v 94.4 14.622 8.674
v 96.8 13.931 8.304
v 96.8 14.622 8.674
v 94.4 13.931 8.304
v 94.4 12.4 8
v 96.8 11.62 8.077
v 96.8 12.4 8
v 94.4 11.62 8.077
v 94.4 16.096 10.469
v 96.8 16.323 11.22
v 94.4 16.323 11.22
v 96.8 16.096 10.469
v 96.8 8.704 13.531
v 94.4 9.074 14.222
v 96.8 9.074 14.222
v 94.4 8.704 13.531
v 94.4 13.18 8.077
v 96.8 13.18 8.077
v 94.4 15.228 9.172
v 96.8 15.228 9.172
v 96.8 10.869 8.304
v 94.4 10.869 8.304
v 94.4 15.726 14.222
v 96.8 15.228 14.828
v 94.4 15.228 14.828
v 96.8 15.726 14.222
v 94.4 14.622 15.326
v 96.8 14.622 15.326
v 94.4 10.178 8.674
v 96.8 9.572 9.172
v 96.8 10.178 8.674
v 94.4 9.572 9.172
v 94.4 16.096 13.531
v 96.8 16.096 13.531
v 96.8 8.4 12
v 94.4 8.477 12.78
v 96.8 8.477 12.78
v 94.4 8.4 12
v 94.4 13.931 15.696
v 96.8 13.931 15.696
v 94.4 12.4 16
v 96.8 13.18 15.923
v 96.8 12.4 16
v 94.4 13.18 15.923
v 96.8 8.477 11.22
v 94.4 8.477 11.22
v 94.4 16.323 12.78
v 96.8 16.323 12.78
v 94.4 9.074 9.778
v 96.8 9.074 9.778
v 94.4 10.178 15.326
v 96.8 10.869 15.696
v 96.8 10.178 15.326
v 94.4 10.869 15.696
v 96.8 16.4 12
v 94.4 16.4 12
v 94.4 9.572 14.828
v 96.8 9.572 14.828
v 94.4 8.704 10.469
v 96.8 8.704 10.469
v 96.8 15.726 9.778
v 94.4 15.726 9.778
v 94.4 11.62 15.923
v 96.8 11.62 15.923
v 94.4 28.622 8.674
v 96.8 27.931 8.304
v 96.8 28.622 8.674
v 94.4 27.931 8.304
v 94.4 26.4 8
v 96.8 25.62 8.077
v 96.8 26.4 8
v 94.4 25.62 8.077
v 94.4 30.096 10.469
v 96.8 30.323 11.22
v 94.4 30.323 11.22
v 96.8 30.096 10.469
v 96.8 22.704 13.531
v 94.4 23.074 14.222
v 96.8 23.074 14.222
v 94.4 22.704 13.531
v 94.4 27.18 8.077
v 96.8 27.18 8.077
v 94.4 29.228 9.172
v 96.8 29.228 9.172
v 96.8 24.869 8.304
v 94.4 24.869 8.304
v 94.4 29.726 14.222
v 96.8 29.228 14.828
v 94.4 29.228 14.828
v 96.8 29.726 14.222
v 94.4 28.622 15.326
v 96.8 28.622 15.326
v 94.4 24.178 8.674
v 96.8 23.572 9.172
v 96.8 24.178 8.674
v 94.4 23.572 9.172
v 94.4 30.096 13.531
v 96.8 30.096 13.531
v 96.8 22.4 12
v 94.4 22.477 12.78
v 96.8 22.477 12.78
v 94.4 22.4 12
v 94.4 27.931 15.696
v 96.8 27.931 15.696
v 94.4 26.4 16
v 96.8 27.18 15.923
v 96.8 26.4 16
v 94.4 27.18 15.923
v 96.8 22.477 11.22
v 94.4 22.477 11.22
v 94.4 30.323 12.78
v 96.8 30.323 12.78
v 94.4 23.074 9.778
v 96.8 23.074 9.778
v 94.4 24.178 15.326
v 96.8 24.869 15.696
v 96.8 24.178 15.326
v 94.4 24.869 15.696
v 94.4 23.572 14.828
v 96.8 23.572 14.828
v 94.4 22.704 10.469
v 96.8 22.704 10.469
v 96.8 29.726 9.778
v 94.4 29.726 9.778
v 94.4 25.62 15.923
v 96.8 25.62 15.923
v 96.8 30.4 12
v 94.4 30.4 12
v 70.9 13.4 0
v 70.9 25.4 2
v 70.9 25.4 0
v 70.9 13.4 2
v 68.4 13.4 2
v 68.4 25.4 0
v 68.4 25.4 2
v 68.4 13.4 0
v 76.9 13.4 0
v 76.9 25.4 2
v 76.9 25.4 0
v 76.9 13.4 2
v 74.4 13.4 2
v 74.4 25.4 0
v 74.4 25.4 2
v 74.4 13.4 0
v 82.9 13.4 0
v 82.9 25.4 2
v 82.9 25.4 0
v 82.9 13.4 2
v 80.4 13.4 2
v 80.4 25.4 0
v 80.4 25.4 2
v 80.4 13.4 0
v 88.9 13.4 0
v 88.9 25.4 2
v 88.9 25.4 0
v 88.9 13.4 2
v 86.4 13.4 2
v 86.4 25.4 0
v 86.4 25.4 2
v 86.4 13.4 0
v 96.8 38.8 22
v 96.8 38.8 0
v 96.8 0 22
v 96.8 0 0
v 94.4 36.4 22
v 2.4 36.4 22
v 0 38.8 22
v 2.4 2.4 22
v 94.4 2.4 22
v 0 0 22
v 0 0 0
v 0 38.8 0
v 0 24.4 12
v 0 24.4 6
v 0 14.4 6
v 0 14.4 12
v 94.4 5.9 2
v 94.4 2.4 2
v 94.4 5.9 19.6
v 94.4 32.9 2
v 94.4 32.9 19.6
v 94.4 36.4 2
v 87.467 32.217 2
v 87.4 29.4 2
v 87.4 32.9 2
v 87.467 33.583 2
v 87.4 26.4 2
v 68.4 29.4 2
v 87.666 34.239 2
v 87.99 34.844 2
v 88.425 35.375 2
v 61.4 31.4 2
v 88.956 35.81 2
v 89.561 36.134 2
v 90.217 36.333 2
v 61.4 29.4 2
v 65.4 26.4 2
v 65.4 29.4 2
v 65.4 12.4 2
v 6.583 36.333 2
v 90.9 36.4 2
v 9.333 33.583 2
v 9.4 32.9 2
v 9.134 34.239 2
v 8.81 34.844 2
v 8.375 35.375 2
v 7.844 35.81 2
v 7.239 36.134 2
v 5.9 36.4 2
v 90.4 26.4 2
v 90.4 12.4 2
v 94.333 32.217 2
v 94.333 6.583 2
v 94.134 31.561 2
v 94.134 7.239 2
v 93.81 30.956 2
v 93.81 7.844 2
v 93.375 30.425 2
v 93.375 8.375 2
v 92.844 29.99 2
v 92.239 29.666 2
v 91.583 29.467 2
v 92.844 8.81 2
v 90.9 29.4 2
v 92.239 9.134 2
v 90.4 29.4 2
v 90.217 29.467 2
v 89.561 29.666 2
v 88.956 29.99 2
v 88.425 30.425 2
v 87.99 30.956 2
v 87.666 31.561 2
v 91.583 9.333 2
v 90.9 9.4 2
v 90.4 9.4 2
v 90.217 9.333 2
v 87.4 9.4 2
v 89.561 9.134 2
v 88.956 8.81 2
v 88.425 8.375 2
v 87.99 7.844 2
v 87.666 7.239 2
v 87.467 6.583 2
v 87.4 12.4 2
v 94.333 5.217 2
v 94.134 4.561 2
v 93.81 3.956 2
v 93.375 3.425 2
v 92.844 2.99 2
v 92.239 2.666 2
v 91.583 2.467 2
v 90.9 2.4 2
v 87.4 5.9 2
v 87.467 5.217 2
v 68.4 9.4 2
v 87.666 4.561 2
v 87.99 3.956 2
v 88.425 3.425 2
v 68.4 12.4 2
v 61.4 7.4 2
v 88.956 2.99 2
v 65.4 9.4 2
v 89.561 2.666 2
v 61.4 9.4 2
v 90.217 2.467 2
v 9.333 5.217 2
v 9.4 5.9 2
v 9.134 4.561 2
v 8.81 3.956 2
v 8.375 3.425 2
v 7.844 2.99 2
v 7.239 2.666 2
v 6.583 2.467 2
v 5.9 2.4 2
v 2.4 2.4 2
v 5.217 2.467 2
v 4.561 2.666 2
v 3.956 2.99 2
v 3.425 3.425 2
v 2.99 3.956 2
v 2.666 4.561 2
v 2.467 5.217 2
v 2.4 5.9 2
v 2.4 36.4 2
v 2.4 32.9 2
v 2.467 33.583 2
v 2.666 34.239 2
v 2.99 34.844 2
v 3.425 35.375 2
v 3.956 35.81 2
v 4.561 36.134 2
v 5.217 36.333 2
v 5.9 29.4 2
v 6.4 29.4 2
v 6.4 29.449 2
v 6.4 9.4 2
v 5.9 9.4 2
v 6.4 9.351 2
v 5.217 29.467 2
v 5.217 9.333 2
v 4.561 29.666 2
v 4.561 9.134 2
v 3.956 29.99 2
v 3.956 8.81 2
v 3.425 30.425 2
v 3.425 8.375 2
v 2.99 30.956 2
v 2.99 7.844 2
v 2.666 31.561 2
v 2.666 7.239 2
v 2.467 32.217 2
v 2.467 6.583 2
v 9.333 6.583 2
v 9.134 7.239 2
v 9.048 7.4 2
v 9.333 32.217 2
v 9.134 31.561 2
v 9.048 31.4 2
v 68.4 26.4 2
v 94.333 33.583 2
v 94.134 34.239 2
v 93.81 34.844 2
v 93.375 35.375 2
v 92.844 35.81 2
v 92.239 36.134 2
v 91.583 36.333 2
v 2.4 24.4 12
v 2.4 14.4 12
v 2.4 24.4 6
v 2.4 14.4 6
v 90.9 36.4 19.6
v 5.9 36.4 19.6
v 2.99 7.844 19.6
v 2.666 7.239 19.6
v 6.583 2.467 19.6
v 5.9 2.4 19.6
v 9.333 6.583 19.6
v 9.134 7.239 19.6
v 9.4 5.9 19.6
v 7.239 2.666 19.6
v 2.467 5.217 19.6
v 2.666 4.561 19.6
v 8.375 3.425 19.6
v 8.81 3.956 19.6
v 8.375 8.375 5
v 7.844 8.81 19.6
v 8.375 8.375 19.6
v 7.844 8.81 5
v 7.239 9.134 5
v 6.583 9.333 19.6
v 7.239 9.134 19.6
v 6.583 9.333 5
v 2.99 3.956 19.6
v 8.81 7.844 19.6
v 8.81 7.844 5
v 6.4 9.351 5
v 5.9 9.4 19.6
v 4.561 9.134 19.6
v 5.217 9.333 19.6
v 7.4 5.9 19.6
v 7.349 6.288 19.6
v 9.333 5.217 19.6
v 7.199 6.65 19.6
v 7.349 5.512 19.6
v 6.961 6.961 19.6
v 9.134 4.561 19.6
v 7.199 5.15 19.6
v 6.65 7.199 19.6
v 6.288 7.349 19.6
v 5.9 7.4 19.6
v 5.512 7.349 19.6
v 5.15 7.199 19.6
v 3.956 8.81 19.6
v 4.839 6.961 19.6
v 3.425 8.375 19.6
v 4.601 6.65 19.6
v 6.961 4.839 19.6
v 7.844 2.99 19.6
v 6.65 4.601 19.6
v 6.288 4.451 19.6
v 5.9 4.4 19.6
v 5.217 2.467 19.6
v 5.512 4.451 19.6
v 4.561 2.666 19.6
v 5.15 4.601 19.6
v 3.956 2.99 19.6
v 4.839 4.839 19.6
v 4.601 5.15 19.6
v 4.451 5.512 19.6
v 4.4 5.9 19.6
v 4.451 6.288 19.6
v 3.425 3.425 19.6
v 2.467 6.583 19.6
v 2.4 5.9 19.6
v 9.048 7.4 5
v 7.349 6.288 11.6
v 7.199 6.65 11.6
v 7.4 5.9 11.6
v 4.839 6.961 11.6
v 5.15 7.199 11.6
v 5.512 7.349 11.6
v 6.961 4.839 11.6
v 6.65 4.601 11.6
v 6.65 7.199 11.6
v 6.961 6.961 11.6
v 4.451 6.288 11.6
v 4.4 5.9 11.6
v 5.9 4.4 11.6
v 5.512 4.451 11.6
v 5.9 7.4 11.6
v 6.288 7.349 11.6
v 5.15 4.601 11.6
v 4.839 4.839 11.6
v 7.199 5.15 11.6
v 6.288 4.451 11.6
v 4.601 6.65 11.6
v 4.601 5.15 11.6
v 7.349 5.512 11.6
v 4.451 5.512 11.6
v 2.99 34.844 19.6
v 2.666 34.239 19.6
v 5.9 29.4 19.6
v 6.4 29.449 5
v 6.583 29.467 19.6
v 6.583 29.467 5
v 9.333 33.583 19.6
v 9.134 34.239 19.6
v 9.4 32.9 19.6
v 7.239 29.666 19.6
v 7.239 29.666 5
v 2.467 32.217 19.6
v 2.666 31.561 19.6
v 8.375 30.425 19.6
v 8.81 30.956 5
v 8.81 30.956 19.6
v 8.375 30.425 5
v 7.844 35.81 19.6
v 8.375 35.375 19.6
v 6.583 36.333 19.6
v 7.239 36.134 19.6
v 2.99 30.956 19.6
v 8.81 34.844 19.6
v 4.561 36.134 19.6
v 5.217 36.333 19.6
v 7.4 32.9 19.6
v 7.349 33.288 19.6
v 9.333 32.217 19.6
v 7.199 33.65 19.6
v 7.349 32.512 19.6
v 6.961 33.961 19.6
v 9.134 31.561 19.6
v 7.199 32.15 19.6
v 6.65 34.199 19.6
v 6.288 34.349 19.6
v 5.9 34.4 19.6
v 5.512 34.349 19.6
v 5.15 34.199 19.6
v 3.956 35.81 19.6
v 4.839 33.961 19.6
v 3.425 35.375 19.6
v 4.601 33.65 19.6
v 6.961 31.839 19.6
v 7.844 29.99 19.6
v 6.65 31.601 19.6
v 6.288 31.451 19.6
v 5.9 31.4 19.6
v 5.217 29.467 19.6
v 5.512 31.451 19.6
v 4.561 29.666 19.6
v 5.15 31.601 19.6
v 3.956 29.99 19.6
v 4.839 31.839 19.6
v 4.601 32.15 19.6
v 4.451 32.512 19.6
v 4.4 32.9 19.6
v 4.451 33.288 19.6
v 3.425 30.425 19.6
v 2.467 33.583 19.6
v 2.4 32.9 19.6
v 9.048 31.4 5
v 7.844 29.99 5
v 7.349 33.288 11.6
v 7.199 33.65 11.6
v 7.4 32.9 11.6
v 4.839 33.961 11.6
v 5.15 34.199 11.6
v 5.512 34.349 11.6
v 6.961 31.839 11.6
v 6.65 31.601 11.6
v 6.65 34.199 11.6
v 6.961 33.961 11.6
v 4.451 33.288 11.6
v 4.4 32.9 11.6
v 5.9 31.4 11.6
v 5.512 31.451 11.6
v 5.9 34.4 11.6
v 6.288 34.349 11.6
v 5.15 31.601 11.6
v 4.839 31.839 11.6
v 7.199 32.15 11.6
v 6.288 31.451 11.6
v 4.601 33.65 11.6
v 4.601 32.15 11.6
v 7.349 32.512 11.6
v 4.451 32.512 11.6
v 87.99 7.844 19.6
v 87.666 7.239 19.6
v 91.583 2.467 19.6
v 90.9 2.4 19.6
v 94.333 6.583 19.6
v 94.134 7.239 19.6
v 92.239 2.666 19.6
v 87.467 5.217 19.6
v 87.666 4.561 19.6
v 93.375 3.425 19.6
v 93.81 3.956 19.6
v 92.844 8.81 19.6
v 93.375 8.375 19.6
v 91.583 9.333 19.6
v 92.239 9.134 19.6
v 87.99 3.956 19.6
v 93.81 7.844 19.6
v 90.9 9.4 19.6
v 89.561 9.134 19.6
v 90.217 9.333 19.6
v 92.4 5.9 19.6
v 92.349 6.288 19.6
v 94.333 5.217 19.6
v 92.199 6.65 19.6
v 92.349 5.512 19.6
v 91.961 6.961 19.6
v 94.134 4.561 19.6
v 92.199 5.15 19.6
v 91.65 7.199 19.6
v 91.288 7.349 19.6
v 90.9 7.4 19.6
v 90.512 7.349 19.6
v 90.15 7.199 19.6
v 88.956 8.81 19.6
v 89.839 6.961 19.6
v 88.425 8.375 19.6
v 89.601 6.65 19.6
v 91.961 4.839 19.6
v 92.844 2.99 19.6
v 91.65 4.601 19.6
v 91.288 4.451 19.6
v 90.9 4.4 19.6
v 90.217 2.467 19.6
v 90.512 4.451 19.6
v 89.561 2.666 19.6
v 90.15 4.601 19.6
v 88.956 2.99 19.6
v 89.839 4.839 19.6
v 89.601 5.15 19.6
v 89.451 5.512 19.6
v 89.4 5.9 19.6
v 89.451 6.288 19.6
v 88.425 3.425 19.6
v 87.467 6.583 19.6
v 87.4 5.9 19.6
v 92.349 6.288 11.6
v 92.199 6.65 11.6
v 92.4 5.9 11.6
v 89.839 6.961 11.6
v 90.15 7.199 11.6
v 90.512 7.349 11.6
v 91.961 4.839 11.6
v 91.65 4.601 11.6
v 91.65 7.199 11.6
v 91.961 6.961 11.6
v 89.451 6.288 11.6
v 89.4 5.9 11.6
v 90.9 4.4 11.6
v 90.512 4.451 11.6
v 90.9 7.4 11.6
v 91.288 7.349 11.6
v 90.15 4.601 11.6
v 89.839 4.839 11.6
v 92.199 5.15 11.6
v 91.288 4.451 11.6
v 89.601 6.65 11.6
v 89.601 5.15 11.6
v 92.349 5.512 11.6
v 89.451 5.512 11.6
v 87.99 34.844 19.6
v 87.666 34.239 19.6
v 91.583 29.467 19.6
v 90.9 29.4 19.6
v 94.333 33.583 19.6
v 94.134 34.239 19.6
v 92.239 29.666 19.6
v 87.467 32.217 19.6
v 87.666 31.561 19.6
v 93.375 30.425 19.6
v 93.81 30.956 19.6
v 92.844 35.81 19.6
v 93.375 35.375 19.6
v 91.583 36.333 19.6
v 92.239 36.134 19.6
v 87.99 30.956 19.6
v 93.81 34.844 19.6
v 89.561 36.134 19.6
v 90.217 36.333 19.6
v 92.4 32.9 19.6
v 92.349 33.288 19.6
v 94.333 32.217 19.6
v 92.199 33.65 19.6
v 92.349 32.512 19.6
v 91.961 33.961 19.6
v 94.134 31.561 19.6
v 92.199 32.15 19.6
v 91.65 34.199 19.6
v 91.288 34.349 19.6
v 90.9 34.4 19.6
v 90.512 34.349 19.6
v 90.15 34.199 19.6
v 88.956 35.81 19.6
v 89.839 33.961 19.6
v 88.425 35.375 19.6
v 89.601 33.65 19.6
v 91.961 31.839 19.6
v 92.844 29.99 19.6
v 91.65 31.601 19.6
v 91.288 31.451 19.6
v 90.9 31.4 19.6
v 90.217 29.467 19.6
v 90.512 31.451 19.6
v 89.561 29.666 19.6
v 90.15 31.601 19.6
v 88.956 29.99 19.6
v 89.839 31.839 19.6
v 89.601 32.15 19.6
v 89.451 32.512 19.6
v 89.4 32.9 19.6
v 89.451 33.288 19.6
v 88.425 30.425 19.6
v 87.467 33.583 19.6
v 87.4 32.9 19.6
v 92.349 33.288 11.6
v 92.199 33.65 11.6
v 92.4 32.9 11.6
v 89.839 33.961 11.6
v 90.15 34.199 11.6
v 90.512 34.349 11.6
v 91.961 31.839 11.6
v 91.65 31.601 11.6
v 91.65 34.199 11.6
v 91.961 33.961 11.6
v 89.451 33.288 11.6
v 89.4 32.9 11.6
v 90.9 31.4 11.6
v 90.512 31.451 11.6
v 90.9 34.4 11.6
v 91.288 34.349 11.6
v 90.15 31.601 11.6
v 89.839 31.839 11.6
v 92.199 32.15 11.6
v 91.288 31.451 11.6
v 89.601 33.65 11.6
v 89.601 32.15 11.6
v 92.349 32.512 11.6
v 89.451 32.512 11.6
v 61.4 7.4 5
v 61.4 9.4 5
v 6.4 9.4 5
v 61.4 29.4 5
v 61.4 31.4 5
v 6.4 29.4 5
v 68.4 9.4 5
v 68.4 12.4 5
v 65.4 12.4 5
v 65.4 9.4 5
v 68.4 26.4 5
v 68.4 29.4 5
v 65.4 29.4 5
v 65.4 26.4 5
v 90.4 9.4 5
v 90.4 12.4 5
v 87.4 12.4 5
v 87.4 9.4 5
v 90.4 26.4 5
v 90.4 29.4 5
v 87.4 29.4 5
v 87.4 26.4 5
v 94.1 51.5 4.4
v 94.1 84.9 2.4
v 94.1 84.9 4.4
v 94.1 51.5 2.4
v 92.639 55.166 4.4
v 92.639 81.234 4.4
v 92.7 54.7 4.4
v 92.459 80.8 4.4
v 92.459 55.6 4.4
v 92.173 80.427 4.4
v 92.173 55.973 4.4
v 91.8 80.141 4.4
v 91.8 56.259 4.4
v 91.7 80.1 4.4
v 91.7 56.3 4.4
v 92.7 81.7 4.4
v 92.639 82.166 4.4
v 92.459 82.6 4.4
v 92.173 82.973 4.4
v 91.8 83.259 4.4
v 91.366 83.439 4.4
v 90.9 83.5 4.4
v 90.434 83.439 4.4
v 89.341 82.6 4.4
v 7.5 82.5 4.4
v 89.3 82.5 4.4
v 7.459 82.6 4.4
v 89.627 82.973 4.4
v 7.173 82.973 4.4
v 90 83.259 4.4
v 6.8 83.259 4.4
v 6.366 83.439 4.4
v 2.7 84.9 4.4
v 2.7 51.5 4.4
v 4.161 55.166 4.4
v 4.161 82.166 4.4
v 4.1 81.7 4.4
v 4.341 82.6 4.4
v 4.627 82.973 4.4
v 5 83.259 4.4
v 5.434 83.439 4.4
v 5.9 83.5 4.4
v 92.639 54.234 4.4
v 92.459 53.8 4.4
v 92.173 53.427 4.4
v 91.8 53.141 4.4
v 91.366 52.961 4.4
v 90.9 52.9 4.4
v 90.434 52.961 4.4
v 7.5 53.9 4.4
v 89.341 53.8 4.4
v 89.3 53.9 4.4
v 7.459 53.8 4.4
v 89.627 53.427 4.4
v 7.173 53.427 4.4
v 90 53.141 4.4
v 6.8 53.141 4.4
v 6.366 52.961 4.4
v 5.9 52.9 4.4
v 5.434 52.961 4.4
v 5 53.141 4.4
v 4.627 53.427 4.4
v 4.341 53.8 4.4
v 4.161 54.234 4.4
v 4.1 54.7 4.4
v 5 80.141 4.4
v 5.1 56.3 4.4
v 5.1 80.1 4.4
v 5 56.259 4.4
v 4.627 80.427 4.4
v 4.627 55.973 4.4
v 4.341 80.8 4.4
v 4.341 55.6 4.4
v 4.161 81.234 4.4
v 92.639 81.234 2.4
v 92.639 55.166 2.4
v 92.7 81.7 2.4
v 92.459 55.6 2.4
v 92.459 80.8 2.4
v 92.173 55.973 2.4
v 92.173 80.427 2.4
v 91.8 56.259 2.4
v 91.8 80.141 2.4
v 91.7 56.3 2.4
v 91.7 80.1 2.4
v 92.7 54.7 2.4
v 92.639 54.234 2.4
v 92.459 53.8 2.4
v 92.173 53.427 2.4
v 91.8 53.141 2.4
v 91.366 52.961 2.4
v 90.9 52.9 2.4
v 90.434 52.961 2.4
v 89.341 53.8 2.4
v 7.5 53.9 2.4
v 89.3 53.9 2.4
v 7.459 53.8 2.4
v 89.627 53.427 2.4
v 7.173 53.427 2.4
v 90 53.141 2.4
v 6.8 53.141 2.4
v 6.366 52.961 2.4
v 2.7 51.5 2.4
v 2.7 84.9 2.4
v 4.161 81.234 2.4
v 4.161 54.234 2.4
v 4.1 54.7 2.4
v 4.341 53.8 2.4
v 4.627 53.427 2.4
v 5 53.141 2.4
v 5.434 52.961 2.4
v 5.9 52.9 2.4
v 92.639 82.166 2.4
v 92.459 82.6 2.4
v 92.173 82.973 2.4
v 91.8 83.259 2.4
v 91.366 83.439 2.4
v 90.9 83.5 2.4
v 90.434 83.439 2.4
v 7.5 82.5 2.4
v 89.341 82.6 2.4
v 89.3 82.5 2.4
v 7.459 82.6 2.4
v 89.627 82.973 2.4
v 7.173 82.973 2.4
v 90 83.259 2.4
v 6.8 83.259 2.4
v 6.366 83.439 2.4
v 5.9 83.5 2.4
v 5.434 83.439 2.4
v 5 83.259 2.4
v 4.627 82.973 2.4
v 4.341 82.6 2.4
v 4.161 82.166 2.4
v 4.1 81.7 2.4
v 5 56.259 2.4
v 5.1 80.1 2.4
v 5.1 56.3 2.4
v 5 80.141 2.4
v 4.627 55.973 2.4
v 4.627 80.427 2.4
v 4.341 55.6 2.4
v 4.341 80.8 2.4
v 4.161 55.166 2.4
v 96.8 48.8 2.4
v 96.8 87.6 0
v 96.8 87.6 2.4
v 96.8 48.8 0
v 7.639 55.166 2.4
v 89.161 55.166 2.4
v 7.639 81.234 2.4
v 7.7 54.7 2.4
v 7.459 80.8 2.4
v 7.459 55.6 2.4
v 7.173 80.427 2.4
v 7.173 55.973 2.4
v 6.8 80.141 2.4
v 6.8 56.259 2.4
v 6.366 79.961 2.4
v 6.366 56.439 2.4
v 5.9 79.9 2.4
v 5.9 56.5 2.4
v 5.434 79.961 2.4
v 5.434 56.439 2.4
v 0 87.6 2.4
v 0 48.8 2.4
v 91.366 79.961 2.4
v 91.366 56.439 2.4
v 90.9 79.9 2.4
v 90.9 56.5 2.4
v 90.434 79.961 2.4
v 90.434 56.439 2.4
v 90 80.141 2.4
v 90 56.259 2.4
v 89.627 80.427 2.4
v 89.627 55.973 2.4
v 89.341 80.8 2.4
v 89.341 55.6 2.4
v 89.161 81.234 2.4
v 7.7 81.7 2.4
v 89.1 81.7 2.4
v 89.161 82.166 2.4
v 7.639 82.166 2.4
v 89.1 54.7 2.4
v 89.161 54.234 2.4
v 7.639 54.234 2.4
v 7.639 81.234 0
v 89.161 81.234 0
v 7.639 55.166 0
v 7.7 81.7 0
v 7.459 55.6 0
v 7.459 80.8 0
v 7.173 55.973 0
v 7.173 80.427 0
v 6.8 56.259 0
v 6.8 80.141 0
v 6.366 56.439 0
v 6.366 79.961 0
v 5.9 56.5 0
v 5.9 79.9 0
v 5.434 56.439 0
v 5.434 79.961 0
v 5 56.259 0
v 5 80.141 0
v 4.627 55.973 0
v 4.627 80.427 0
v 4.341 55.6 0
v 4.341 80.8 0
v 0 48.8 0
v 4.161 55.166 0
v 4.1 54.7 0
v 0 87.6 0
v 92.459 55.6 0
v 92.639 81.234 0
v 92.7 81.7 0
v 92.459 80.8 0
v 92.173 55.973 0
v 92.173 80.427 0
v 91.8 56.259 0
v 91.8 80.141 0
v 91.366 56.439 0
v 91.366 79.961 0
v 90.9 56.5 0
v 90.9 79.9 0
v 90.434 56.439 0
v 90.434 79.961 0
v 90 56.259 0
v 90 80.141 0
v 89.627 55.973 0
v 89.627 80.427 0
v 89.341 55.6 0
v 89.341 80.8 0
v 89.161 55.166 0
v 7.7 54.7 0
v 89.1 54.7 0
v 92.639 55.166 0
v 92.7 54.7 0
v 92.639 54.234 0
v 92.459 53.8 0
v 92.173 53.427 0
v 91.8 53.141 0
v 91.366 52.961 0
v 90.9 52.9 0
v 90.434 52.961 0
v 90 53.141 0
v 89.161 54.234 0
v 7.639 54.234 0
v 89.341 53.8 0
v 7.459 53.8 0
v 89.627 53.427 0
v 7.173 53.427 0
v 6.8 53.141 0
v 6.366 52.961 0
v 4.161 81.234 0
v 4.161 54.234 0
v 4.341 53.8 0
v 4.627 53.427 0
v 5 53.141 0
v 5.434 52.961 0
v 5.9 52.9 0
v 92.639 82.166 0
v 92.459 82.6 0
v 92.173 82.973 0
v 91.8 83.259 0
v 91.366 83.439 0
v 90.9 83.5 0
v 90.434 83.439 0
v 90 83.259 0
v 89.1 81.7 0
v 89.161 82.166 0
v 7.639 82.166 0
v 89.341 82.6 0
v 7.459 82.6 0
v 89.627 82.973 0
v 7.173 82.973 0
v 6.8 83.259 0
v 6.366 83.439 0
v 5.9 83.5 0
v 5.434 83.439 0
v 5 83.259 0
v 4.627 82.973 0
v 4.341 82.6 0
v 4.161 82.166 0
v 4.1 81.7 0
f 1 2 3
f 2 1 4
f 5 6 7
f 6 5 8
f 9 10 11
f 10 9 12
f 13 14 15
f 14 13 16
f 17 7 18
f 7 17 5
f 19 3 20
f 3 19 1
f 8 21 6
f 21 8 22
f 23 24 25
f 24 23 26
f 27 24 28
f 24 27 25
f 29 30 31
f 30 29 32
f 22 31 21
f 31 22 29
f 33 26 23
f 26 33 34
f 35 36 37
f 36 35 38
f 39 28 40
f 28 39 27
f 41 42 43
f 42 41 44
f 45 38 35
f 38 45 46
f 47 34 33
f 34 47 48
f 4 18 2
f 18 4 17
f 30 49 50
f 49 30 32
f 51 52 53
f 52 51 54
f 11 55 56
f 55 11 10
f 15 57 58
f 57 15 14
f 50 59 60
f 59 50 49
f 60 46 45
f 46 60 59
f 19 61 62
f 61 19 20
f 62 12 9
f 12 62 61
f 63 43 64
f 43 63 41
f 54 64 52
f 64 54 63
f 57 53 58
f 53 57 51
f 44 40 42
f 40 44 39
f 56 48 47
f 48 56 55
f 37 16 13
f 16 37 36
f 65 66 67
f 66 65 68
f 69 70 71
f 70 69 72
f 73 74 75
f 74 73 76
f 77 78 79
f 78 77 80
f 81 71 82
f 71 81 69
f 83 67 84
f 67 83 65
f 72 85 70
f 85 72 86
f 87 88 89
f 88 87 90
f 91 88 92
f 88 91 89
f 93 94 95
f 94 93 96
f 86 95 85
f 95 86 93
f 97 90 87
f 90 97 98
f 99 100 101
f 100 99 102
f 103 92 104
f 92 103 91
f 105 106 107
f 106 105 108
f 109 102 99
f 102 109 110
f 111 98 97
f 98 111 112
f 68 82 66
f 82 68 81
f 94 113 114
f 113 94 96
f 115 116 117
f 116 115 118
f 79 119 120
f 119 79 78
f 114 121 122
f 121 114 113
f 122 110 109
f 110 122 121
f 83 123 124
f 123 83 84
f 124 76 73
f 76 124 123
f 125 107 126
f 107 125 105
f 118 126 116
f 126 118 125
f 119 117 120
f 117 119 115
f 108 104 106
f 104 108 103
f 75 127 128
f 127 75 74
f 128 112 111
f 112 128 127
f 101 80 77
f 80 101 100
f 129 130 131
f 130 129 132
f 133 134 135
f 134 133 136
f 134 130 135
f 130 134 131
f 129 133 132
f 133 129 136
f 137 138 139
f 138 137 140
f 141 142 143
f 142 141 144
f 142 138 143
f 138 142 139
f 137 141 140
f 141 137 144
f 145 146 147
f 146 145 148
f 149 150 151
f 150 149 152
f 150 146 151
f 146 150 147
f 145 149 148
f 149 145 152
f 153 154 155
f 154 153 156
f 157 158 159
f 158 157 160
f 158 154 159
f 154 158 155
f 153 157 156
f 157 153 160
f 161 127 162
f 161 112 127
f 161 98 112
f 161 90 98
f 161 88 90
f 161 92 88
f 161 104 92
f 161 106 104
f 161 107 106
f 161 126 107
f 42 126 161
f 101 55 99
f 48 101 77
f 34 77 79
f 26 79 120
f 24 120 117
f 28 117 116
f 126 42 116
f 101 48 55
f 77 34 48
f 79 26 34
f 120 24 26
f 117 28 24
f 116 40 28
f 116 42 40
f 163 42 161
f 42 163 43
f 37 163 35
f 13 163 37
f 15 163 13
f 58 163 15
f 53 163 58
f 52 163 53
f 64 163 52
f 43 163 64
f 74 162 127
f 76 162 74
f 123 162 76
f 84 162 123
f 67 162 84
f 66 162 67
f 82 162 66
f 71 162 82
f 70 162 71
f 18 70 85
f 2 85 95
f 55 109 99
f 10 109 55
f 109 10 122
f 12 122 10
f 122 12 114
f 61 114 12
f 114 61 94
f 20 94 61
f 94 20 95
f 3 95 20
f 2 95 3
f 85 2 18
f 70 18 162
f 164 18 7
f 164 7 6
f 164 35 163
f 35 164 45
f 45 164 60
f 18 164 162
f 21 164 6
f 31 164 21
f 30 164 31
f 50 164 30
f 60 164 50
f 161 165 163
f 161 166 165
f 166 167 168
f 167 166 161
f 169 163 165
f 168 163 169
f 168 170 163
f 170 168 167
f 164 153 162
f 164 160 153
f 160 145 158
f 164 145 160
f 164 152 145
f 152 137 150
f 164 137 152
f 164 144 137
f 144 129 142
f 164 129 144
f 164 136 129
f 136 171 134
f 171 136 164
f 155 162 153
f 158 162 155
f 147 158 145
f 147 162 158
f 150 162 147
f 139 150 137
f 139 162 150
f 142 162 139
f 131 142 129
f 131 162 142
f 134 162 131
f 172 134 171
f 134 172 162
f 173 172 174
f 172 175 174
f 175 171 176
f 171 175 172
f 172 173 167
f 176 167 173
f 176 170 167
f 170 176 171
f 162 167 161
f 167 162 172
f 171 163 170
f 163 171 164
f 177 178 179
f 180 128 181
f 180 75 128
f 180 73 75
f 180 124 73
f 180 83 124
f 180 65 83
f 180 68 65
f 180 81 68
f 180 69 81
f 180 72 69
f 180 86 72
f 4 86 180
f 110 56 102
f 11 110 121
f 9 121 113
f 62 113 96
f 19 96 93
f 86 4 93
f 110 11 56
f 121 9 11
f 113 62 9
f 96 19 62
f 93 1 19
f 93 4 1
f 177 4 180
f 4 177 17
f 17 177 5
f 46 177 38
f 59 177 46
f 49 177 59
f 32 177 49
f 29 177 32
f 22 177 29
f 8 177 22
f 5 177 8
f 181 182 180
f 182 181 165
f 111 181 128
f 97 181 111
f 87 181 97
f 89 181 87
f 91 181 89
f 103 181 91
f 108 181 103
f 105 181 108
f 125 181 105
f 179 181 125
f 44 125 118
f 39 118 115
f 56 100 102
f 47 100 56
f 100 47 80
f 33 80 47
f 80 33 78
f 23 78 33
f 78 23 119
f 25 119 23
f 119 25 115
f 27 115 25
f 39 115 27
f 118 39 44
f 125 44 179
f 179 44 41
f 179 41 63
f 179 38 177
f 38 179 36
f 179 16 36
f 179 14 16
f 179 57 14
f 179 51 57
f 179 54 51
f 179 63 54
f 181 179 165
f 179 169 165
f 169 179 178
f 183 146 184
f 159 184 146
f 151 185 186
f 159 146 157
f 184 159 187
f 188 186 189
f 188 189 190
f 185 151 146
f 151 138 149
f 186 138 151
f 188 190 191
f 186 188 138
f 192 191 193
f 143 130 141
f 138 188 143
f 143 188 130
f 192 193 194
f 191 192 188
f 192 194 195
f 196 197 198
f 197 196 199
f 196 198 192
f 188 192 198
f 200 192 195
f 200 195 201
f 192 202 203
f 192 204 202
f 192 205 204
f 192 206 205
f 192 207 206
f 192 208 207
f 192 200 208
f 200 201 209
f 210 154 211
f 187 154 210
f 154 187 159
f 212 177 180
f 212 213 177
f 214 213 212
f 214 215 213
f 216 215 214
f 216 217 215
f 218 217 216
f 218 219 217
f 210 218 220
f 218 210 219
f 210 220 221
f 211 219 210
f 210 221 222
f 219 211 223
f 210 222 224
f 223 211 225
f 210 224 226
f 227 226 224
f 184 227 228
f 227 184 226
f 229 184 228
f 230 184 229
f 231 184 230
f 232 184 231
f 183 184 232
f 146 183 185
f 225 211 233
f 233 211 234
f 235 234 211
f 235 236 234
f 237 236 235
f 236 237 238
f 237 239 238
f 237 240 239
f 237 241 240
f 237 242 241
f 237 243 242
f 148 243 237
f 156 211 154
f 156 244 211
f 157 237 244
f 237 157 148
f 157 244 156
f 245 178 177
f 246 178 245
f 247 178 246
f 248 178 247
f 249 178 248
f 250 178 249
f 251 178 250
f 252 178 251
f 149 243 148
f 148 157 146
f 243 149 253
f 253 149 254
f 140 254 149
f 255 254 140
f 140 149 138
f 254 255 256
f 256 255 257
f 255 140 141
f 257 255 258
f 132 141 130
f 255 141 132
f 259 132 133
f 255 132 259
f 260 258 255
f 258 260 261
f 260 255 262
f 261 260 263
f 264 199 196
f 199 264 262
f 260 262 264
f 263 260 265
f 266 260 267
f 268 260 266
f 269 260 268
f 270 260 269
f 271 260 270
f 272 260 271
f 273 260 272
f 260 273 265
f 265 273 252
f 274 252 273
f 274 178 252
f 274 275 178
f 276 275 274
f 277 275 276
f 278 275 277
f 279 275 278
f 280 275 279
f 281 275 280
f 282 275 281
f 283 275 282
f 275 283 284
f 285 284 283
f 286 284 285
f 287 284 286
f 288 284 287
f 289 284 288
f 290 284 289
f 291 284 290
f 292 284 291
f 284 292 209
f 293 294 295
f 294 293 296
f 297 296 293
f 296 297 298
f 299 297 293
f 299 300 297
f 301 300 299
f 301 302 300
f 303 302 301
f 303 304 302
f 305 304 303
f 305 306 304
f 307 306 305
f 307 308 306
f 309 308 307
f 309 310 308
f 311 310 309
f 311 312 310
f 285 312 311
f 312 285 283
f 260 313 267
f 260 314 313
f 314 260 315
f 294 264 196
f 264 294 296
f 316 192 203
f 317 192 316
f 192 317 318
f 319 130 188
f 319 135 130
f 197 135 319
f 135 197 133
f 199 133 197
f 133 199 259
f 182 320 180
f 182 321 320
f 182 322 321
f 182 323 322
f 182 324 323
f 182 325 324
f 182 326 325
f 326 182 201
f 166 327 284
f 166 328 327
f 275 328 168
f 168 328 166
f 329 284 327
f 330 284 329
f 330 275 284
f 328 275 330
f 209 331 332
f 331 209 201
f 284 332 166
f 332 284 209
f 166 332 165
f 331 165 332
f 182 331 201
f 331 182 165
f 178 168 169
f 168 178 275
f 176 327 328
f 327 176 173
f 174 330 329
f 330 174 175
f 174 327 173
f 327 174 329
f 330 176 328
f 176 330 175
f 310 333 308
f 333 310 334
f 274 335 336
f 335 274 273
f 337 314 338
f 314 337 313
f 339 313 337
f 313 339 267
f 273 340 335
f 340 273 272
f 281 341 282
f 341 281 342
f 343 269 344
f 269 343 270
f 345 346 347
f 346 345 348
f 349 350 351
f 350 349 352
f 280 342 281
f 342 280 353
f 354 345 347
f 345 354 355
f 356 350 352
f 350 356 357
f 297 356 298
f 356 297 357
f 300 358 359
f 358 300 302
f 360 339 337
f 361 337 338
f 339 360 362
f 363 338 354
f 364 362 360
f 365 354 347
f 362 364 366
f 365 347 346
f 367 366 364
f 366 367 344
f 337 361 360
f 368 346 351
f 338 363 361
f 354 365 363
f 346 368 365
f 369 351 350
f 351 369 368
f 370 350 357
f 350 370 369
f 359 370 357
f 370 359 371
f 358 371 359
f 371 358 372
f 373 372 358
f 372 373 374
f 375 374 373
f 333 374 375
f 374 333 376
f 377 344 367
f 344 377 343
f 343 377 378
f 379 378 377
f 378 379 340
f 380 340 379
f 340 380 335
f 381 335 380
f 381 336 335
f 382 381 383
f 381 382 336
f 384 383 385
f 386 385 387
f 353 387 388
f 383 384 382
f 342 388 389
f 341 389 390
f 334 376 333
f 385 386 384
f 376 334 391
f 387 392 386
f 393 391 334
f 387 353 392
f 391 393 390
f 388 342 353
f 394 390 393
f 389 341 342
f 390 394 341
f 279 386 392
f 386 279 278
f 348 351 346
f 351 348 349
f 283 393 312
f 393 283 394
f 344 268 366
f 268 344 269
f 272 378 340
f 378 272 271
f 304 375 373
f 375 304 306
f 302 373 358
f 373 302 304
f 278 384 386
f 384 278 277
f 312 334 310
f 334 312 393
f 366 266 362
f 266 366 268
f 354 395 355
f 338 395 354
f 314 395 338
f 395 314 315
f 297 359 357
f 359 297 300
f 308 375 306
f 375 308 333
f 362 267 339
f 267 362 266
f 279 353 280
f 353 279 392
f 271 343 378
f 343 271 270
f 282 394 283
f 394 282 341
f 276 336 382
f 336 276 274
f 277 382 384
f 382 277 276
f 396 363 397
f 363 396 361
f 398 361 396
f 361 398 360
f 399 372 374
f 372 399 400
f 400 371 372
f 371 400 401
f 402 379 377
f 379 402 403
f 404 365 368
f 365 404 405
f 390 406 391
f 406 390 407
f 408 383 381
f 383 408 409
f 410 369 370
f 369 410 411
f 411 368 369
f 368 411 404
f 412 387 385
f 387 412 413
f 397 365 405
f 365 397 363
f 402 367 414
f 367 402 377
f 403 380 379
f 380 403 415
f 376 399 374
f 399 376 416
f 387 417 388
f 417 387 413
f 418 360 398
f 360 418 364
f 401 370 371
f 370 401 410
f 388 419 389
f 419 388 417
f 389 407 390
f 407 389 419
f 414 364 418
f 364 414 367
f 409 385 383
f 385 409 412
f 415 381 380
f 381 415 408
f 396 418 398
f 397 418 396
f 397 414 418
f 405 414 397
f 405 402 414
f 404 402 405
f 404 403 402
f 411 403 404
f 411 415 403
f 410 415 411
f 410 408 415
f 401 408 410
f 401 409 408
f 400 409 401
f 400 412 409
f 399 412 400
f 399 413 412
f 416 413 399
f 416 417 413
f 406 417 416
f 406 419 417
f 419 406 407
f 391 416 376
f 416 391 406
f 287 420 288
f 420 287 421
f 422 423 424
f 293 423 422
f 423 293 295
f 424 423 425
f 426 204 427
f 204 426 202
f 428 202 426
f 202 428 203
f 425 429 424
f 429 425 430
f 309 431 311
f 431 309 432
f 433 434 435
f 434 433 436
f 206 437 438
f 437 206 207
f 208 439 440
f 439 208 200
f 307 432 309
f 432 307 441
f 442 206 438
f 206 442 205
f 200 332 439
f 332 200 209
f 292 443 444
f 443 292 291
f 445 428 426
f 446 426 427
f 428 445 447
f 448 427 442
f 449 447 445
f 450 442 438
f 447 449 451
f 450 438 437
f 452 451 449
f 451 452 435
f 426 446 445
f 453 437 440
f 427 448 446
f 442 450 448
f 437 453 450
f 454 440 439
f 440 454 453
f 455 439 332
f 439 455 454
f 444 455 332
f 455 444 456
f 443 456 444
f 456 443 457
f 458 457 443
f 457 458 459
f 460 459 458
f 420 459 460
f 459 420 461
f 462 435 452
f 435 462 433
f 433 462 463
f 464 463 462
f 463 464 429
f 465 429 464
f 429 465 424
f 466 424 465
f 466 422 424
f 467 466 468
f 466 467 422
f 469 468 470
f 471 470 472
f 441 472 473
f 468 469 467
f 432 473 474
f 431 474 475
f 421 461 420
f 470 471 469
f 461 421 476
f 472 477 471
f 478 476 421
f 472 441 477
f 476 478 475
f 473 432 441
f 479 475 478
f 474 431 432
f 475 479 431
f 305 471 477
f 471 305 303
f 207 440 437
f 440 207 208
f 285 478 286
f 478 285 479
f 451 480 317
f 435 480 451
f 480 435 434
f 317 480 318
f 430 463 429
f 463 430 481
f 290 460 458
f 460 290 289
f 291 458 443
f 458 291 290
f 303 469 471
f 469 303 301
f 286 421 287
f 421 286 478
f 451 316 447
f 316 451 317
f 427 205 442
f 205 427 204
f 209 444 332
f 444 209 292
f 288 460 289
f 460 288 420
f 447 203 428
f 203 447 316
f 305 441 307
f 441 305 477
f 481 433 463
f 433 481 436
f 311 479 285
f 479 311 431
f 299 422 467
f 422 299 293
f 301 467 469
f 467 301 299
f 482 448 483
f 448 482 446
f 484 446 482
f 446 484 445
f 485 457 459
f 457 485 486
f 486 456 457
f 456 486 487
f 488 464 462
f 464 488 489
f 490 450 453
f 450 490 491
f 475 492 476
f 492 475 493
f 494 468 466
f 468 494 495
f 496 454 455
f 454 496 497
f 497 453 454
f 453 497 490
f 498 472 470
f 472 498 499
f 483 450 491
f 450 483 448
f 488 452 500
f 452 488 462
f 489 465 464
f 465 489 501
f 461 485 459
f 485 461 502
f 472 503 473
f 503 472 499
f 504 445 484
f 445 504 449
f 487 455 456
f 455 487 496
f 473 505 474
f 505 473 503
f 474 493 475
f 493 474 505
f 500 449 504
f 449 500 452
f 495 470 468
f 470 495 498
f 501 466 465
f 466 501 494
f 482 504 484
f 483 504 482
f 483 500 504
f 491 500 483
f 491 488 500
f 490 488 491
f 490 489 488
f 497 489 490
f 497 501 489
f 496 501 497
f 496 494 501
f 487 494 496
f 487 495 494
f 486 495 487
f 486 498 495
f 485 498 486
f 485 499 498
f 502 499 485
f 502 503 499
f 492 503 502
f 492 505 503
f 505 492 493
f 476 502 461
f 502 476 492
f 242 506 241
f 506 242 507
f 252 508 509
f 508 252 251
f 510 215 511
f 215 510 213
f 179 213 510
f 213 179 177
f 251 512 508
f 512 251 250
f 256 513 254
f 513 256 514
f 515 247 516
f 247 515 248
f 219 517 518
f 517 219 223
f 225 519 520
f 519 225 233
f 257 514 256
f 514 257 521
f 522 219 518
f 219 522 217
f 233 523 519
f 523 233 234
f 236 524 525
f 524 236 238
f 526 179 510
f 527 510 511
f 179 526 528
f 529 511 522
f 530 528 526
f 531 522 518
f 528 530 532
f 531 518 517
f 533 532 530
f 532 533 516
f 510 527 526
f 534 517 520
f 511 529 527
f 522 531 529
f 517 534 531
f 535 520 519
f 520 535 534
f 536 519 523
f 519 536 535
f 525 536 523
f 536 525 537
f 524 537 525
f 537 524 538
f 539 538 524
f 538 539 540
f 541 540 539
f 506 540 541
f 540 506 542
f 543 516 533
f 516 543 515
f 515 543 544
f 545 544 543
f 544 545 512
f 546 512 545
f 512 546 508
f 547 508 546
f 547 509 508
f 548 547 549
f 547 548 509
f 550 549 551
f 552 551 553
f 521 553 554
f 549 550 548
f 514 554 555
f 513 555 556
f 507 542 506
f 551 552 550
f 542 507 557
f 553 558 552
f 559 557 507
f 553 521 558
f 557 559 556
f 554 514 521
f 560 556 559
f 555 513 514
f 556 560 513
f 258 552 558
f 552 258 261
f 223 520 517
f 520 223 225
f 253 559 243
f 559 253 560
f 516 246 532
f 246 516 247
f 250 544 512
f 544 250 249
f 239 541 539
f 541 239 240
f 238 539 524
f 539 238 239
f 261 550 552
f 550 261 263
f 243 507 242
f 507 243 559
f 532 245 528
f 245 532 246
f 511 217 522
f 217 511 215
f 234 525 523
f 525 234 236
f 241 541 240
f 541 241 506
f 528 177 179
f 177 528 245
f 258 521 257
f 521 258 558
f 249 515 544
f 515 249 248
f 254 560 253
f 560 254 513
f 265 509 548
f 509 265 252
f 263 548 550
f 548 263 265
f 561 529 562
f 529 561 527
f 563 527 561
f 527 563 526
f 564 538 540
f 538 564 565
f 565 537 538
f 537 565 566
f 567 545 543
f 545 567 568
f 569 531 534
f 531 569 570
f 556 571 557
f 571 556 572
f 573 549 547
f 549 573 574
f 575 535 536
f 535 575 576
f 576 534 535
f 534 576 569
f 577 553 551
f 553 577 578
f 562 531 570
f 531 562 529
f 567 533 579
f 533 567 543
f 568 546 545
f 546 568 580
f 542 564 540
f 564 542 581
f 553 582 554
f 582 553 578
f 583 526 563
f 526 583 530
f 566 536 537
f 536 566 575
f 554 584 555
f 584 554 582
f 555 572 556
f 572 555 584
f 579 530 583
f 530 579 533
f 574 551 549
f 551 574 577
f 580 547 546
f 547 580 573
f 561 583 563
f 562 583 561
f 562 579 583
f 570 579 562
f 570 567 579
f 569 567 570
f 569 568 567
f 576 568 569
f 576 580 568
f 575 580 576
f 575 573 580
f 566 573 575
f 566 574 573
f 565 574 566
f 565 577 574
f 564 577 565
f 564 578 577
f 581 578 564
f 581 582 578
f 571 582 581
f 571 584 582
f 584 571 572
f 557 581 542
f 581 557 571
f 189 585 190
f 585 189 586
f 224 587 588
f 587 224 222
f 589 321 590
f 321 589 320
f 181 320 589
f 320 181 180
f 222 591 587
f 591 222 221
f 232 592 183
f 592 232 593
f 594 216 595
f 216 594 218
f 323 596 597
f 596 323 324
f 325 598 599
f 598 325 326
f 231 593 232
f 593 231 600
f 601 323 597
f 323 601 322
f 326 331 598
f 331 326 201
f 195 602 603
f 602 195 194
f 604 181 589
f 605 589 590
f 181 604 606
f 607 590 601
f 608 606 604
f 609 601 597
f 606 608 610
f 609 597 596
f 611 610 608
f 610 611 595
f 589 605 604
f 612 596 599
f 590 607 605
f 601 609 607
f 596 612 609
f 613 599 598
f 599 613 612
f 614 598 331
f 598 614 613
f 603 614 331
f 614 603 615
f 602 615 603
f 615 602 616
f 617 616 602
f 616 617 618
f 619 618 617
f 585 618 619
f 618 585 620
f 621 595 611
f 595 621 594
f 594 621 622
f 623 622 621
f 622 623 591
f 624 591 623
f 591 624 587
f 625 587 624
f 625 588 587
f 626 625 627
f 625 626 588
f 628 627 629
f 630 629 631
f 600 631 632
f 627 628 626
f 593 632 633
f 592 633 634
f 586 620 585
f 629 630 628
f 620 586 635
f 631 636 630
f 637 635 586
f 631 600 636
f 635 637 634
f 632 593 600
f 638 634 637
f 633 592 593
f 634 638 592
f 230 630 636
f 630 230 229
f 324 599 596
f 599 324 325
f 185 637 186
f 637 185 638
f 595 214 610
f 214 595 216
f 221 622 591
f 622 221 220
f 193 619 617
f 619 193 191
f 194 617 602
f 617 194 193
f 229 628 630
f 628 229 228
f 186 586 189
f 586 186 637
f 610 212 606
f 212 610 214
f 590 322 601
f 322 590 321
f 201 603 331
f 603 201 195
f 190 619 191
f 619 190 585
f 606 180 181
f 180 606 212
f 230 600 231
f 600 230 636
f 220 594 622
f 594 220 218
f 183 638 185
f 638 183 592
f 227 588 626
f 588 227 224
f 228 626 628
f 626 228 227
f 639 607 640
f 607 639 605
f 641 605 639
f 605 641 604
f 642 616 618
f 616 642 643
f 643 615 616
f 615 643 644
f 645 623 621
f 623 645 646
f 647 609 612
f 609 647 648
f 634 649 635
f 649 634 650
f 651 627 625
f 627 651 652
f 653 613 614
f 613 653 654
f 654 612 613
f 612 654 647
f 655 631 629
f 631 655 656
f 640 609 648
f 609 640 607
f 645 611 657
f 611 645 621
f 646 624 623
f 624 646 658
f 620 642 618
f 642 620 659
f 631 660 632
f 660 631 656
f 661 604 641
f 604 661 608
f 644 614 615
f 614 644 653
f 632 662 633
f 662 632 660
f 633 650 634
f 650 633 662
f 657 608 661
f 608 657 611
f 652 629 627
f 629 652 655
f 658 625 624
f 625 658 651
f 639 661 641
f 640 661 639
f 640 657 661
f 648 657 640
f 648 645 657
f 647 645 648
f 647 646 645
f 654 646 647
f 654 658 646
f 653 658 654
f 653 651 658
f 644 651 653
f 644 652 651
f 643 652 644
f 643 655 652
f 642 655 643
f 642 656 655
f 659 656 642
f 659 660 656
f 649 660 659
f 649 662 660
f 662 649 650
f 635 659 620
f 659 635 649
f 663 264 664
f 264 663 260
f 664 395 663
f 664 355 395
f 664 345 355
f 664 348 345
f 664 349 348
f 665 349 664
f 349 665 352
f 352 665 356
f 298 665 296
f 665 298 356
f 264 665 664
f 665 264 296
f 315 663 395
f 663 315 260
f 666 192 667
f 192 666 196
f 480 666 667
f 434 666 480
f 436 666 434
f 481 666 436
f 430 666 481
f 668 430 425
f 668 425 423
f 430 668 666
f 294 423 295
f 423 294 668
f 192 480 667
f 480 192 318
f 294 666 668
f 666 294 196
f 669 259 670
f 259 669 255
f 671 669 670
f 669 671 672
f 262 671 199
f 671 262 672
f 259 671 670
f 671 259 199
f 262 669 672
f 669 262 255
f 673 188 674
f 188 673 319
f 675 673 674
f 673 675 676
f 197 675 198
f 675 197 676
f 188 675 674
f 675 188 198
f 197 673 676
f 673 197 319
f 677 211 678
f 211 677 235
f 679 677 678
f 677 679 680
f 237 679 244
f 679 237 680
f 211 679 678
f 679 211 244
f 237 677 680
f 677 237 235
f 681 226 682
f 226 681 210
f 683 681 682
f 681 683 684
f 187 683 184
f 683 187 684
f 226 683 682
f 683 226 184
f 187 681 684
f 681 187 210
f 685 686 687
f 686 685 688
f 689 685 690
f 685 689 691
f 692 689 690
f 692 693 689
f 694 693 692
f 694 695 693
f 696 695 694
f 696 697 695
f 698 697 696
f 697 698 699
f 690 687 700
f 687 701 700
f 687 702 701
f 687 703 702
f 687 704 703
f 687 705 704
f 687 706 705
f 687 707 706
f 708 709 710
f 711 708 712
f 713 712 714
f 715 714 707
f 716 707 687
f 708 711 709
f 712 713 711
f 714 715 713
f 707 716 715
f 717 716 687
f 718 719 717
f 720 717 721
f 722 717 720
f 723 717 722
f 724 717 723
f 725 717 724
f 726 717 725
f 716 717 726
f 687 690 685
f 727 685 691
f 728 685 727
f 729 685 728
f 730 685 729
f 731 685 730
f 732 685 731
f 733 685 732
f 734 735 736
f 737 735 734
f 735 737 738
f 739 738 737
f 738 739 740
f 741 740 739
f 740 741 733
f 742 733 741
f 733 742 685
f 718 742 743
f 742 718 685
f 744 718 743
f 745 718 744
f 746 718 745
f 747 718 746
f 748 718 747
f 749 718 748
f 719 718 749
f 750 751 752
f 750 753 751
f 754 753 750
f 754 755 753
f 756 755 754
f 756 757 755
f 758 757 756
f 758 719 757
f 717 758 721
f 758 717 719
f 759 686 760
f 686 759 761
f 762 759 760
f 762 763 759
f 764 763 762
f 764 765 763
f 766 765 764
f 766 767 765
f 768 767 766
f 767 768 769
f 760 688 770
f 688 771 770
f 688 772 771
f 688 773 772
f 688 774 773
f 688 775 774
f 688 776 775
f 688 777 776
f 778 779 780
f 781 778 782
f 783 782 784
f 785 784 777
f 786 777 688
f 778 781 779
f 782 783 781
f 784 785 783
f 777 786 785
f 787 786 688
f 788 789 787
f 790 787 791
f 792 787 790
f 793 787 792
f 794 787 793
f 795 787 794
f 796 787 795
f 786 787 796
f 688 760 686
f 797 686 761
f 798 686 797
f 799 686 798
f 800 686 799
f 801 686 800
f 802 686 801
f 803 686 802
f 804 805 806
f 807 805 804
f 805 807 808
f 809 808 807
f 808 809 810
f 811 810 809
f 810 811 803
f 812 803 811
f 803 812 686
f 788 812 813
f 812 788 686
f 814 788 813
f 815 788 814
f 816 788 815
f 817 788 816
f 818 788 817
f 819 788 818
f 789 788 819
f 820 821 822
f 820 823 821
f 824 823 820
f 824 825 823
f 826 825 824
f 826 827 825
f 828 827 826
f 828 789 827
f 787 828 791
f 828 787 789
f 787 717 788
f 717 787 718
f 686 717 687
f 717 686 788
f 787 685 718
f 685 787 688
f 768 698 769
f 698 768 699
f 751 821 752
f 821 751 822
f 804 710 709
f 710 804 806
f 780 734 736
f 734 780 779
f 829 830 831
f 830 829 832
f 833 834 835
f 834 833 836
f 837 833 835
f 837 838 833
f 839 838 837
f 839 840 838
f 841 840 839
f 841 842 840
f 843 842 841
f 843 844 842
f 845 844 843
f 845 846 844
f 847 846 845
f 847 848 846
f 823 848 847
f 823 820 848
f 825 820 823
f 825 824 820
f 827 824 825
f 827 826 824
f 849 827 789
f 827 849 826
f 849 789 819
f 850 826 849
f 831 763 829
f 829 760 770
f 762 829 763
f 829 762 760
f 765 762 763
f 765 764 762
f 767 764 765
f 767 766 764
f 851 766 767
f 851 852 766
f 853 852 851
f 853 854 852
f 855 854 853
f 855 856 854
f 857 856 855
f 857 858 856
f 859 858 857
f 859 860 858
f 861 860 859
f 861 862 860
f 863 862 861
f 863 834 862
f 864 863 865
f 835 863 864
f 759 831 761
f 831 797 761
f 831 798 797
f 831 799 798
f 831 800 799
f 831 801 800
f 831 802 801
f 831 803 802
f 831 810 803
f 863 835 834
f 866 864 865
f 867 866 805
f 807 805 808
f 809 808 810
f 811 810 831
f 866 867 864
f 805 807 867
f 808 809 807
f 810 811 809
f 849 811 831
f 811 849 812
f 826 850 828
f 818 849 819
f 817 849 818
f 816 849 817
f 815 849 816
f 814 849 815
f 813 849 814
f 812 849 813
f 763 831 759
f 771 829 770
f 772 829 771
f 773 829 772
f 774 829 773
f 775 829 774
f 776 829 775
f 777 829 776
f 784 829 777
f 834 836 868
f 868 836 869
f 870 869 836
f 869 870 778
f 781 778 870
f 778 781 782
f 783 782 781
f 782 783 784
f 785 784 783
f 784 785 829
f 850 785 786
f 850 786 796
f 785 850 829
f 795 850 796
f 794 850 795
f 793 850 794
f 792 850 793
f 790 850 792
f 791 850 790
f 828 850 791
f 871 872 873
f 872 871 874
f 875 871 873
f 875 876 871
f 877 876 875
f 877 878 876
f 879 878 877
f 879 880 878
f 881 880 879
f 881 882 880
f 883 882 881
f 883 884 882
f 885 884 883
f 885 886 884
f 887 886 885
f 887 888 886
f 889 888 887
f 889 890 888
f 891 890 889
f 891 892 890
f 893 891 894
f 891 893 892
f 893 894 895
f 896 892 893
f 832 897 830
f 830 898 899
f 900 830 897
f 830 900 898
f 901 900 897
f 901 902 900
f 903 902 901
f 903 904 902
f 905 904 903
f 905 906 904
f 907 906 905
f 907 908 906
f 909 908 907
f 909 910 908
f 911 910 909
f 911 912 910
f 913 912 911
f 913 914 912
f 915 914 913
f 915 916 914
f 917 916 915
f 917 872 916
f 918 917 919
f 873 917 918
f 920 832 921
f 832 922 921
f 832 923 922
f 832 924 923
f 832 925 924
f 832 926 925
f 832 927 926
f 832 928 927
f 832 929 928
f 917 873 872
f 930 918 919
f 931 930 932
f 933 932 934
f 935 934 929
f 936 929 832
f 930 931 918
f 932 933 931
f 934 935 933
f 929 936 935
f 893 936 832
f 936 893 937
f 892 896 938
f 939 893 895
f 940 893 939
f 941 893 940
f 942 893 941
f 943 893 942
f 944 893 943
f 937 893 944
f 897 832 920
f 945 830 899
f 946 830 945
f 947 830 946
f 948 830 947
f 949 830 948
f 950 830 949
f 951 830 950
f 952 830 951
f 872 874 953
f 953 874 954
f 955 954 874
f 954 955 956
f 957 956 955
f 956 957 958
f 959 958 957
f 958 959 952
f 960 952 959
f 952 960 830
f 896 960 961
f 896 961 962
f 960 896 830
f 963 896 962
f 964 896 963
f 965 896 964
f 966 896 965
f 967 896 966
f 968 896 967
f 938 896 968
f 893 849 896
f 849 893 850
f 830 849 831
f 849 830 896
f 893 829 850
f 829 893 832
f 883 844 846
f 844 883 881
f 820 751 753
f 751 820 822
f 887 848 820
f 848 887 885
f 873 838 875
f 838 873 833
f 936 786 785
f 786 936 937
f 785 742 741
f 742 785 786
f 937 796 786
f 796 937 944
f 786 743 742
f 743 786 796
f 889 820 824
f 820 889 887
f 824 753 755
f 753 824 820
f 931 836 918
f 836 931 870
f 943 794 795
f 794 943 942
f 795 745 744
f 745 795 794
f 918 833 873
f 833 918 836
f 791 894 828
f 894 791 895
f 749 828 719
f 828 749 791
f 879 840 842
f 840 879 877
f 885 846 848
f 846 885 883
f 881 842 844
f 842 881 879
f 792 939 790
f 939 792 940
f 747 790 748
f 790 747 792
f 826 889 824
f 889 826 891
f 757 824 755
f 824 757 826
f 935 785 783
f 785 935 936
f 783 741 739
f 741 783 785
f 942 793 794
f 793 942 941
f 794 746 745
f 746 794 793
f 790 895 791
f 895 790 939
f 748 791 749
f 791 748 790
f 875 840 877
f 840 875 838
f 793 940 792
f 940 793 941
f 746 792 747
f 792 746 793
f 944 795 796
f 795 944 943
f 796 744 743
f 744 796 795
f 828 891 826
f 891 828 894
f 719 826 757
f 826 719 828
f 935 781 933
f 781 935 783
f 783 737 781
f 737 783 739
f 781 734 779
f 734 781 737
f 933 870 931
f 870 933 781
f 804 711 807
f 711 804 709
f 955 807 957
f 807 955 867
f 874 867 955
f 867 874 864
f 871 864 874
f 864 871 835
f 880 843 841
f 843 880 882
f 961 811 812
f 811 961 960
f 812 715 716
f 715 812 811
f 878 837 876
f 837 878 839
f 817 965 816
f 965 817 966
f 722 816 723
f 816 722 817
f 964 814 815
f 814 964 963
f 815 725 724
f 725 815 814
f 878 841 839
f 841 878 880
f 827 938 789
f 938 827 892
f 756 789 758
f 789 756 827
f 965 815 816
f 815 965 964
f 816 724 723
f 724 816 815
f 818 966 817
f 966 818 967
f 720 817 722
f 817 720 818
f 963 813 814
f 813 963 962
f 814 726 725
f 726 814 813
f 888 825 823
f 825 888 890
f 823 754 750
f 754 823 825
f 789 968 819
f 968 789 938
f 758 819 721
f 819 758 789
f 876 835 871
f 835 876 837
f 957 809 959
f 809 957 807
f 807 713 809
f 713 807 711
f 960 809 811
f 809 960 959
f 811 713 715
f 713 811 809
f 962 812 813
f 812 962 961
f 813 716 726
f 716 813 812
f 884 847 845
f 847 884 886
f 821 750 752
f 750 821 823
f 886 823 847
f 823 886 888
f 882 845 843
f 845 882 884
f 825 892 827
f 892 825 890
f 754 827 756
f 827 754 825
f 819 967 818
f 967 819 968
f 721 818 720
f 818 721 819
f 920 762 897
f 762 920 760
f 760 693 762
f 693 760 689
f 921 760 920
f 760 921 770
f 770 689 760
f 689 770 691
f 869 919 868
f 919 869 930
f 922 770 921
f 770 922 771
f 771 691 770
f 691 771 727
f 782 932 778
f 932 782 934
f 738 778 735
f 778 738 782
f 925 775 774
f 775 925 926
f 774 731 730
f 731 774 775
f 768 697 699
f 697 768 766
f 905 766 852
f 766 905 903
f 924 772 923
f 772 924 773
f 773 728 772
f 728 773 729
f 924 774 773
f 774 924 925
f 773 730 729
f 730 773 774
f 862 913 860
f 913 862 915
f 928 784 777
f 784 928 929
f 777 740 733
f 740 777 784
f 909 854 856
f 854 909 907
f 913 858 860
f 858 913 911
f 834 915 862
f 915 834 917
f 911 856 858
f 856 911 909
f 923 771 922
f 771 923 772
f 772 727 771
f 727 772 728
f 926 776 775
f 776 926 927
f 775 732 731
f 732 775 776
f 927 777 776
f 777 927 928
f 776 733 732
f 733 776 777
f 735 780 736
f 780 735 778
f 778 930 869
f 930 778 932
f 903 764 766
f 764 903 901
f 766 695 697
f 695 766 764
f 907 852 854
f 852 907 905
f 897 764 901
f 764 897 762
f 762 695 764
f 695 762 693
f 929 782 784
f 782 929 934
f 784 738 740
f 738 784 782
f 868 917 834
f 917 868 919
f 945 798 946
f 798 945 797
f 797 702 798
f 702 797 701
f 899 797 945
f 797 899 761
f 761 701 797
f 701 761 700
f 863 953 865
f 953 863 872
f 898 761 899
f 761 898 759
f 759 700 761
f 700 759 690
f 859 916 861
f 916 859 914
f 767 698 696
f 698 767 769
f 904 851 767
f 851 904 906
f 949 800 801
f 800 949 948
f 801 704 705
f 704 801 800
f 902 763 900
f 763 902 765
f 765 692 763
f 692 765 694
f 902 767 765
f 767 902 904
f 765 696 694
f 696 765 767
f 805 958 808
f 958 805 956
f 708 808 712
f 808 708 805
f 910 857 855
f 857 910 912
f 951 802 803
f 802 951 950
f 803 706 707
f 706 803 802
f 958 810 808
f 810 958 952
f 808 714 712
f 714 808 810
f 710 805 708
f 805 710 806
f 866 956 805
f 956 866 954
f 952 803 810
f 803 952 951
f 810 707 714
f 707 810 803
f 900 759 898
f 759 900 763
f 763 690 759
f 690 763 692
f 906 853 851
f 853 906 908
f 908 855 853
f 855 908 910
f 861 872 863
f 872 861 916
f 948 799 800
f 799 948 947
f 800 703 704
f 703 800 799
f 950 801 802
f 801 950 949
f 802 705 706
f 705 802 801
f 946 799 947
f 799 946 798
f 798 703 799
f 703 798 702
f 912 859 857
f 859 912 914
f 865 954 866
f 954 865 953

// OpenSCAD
// Enclosure for the bridge node: ESP32-C3 dev board + 12V->5V buck converter + input filter parts.
// Parametric OpenSCAD. Print in PETG (hot engine bay / cabin). Measure your real boards and edit the
// "Board dimensions" section before printing.
//
// Render one part at a time:  part = "base" or "lid" (or "both" for a preview).

part = "both";

// ---- Board dimensions (mm) -- MEASURE THESE ----------------------------
c3_len = 55;      // ESP32-C3-DevKitM-1 is roughly 55 x 26; check yours
c3_wid = 26;
c3_hole_dx = 0;   // set to 0 to skip C3 standoffs and let it sit on a foam pad instead
buck_len = 25;    // buck + TVS + caps area (D24V10F5 itself is smaller; leave room for the 100uF cap)
buck_wid = 20;
comp_height = 14; // tallest part above the PCB (pin headers / electrolytic cap)

// ---- Box settings -------------------------------------------------------
wall = 2.4;
floor_t = 2.0;
gap = 4;                  // clearance between boards and walls
standoff_h = 3;           // lifts boards off the floor
lid_t = 2.4;
screw_d = 3.0;            // M3 self-tapping into corner posts
post_d = 7;
tol = 0.3;                // lid fit

// ---- Derived ------------------------------------------------------------
in_len = c3_len + buck_len + 3 * gap;
in_wid = max(c3_wid, buck_wid) + 2 * gap;
in_hgt = standoff_h + comp_height + 3;
out_len = in_len + 2 * wall;
out_wid = in_wid + 2 * wall;
out_hgt = in_hgt + floor_t;

usb_w = 10; usb_h = 4;     // USB-C opening (on the -X end wall, so it faces the C3's USB port)
gland_d = 8;               // cable gland / grommet hole for 12V in and ECU serial wires (+X end wall)

module post(x, y, h) {
  translate([x, y, 0]) difference() {
    cylinder(d = post_d, h = h, $fn = 32);
    translate([0, 0, h - 8]) cylinder(d = screw_d, h = 8.1, $fn = 24);
  }
}

module base() {
  difference() {
    cube([out_len, out_wid, out_hgt]);
    // cavity
    translate([wall, wall, floor_t]) cube([in_len, in_wid, out_hgt]);
    // USB-C slot, centred on the C3 board, at board height
    translate([-1, out_wid / 2 - usb_w / 2, floor_t + standoff_h + 1])
      cube([wall + 2, usb_w, usb_h + 2]);
    // wire holes on the far end: 12V in, ECU TX/RX/GND out
    for (dy = [-7, 7])
      translate([out_len - wall - 1, out_wid / 2 + dy, floor_t + in_hgt / 2])
        rotate([0, 90, 0]) cylinder(d = gland_d, h = wall + 2, $fn = 32);
    // vent slots in the floor (buck gets warm)
    for (i = [0 : 3])
      translate([wall + c3_len + 2 * gap + 3 + i * 6, out_wid / 2 - 6, -1])
        cube([2.5, 12, floor_t + 2]);
  }
  // corner screw posts, flush into the corners
  p = post_d / 2;
  for (x = [wall + p, out_len - wall - p], y = [wall + p, out_wid - wall - p])
    post(x, y, out_hgt - lid_t);
  // board standoffs
  if (c3_hole_dx != 0 || true) {
    // C3 rests on two rails (keeps pin headers clear underneath)
    for (dy = [-c3_wid / 2 + 2, c3_wid / 2 - 2])
      translate([wall + gap, out_wid / 2 + dy - 1, floor_t])
        cube([c3_len, 2, standoff_h]);
    // buck area: four small pads
    bx = wall + c3_len + 2 * gap;
    for (x = [bx, bx + buck_len - 3], y = [out_wid / 2 - buck_wid / 2, out_wid / 2 + buck_wid / 2 - 3])
      translate([x, y, floor_t]) cube([3, 3, standoff_h]);
  }
}

module lid() {
  p = post_d / 2;
  difference() {
    union() {
      cube([out_len, out_wid, lid_t]);
      // inner lip locates the lid
      translate([wall + tol, wall + tol, lid_t])
        difference() {
          cube([in_len - 2 * tol, in_wid - 2 * tol, 2]);
          translate([wall, wall, -1]) cube([in_len - 2 * tol - 2 * wall, in_wid - 2 * tol - 2 * wall, 4]);
        }
    }
    for (x = [wall + p, out_len - wall - p], y = [wall + p, out_wid - wall - p])
      translate([x, y, -1]) cylinder(d = screw_d + 0.6, h = lid_t + 4, $fn = 24);
  }
}

if (part == "base" || part == "both") base();
if (part == "lid" || part == "both") translate([0, part == "both" ? out_wid + 10 : 0, 0]) lid();

echo(str("Outer size: ", out_len, " x ", out_wid, " x ", out_hgt + lid_t, " mm"));
